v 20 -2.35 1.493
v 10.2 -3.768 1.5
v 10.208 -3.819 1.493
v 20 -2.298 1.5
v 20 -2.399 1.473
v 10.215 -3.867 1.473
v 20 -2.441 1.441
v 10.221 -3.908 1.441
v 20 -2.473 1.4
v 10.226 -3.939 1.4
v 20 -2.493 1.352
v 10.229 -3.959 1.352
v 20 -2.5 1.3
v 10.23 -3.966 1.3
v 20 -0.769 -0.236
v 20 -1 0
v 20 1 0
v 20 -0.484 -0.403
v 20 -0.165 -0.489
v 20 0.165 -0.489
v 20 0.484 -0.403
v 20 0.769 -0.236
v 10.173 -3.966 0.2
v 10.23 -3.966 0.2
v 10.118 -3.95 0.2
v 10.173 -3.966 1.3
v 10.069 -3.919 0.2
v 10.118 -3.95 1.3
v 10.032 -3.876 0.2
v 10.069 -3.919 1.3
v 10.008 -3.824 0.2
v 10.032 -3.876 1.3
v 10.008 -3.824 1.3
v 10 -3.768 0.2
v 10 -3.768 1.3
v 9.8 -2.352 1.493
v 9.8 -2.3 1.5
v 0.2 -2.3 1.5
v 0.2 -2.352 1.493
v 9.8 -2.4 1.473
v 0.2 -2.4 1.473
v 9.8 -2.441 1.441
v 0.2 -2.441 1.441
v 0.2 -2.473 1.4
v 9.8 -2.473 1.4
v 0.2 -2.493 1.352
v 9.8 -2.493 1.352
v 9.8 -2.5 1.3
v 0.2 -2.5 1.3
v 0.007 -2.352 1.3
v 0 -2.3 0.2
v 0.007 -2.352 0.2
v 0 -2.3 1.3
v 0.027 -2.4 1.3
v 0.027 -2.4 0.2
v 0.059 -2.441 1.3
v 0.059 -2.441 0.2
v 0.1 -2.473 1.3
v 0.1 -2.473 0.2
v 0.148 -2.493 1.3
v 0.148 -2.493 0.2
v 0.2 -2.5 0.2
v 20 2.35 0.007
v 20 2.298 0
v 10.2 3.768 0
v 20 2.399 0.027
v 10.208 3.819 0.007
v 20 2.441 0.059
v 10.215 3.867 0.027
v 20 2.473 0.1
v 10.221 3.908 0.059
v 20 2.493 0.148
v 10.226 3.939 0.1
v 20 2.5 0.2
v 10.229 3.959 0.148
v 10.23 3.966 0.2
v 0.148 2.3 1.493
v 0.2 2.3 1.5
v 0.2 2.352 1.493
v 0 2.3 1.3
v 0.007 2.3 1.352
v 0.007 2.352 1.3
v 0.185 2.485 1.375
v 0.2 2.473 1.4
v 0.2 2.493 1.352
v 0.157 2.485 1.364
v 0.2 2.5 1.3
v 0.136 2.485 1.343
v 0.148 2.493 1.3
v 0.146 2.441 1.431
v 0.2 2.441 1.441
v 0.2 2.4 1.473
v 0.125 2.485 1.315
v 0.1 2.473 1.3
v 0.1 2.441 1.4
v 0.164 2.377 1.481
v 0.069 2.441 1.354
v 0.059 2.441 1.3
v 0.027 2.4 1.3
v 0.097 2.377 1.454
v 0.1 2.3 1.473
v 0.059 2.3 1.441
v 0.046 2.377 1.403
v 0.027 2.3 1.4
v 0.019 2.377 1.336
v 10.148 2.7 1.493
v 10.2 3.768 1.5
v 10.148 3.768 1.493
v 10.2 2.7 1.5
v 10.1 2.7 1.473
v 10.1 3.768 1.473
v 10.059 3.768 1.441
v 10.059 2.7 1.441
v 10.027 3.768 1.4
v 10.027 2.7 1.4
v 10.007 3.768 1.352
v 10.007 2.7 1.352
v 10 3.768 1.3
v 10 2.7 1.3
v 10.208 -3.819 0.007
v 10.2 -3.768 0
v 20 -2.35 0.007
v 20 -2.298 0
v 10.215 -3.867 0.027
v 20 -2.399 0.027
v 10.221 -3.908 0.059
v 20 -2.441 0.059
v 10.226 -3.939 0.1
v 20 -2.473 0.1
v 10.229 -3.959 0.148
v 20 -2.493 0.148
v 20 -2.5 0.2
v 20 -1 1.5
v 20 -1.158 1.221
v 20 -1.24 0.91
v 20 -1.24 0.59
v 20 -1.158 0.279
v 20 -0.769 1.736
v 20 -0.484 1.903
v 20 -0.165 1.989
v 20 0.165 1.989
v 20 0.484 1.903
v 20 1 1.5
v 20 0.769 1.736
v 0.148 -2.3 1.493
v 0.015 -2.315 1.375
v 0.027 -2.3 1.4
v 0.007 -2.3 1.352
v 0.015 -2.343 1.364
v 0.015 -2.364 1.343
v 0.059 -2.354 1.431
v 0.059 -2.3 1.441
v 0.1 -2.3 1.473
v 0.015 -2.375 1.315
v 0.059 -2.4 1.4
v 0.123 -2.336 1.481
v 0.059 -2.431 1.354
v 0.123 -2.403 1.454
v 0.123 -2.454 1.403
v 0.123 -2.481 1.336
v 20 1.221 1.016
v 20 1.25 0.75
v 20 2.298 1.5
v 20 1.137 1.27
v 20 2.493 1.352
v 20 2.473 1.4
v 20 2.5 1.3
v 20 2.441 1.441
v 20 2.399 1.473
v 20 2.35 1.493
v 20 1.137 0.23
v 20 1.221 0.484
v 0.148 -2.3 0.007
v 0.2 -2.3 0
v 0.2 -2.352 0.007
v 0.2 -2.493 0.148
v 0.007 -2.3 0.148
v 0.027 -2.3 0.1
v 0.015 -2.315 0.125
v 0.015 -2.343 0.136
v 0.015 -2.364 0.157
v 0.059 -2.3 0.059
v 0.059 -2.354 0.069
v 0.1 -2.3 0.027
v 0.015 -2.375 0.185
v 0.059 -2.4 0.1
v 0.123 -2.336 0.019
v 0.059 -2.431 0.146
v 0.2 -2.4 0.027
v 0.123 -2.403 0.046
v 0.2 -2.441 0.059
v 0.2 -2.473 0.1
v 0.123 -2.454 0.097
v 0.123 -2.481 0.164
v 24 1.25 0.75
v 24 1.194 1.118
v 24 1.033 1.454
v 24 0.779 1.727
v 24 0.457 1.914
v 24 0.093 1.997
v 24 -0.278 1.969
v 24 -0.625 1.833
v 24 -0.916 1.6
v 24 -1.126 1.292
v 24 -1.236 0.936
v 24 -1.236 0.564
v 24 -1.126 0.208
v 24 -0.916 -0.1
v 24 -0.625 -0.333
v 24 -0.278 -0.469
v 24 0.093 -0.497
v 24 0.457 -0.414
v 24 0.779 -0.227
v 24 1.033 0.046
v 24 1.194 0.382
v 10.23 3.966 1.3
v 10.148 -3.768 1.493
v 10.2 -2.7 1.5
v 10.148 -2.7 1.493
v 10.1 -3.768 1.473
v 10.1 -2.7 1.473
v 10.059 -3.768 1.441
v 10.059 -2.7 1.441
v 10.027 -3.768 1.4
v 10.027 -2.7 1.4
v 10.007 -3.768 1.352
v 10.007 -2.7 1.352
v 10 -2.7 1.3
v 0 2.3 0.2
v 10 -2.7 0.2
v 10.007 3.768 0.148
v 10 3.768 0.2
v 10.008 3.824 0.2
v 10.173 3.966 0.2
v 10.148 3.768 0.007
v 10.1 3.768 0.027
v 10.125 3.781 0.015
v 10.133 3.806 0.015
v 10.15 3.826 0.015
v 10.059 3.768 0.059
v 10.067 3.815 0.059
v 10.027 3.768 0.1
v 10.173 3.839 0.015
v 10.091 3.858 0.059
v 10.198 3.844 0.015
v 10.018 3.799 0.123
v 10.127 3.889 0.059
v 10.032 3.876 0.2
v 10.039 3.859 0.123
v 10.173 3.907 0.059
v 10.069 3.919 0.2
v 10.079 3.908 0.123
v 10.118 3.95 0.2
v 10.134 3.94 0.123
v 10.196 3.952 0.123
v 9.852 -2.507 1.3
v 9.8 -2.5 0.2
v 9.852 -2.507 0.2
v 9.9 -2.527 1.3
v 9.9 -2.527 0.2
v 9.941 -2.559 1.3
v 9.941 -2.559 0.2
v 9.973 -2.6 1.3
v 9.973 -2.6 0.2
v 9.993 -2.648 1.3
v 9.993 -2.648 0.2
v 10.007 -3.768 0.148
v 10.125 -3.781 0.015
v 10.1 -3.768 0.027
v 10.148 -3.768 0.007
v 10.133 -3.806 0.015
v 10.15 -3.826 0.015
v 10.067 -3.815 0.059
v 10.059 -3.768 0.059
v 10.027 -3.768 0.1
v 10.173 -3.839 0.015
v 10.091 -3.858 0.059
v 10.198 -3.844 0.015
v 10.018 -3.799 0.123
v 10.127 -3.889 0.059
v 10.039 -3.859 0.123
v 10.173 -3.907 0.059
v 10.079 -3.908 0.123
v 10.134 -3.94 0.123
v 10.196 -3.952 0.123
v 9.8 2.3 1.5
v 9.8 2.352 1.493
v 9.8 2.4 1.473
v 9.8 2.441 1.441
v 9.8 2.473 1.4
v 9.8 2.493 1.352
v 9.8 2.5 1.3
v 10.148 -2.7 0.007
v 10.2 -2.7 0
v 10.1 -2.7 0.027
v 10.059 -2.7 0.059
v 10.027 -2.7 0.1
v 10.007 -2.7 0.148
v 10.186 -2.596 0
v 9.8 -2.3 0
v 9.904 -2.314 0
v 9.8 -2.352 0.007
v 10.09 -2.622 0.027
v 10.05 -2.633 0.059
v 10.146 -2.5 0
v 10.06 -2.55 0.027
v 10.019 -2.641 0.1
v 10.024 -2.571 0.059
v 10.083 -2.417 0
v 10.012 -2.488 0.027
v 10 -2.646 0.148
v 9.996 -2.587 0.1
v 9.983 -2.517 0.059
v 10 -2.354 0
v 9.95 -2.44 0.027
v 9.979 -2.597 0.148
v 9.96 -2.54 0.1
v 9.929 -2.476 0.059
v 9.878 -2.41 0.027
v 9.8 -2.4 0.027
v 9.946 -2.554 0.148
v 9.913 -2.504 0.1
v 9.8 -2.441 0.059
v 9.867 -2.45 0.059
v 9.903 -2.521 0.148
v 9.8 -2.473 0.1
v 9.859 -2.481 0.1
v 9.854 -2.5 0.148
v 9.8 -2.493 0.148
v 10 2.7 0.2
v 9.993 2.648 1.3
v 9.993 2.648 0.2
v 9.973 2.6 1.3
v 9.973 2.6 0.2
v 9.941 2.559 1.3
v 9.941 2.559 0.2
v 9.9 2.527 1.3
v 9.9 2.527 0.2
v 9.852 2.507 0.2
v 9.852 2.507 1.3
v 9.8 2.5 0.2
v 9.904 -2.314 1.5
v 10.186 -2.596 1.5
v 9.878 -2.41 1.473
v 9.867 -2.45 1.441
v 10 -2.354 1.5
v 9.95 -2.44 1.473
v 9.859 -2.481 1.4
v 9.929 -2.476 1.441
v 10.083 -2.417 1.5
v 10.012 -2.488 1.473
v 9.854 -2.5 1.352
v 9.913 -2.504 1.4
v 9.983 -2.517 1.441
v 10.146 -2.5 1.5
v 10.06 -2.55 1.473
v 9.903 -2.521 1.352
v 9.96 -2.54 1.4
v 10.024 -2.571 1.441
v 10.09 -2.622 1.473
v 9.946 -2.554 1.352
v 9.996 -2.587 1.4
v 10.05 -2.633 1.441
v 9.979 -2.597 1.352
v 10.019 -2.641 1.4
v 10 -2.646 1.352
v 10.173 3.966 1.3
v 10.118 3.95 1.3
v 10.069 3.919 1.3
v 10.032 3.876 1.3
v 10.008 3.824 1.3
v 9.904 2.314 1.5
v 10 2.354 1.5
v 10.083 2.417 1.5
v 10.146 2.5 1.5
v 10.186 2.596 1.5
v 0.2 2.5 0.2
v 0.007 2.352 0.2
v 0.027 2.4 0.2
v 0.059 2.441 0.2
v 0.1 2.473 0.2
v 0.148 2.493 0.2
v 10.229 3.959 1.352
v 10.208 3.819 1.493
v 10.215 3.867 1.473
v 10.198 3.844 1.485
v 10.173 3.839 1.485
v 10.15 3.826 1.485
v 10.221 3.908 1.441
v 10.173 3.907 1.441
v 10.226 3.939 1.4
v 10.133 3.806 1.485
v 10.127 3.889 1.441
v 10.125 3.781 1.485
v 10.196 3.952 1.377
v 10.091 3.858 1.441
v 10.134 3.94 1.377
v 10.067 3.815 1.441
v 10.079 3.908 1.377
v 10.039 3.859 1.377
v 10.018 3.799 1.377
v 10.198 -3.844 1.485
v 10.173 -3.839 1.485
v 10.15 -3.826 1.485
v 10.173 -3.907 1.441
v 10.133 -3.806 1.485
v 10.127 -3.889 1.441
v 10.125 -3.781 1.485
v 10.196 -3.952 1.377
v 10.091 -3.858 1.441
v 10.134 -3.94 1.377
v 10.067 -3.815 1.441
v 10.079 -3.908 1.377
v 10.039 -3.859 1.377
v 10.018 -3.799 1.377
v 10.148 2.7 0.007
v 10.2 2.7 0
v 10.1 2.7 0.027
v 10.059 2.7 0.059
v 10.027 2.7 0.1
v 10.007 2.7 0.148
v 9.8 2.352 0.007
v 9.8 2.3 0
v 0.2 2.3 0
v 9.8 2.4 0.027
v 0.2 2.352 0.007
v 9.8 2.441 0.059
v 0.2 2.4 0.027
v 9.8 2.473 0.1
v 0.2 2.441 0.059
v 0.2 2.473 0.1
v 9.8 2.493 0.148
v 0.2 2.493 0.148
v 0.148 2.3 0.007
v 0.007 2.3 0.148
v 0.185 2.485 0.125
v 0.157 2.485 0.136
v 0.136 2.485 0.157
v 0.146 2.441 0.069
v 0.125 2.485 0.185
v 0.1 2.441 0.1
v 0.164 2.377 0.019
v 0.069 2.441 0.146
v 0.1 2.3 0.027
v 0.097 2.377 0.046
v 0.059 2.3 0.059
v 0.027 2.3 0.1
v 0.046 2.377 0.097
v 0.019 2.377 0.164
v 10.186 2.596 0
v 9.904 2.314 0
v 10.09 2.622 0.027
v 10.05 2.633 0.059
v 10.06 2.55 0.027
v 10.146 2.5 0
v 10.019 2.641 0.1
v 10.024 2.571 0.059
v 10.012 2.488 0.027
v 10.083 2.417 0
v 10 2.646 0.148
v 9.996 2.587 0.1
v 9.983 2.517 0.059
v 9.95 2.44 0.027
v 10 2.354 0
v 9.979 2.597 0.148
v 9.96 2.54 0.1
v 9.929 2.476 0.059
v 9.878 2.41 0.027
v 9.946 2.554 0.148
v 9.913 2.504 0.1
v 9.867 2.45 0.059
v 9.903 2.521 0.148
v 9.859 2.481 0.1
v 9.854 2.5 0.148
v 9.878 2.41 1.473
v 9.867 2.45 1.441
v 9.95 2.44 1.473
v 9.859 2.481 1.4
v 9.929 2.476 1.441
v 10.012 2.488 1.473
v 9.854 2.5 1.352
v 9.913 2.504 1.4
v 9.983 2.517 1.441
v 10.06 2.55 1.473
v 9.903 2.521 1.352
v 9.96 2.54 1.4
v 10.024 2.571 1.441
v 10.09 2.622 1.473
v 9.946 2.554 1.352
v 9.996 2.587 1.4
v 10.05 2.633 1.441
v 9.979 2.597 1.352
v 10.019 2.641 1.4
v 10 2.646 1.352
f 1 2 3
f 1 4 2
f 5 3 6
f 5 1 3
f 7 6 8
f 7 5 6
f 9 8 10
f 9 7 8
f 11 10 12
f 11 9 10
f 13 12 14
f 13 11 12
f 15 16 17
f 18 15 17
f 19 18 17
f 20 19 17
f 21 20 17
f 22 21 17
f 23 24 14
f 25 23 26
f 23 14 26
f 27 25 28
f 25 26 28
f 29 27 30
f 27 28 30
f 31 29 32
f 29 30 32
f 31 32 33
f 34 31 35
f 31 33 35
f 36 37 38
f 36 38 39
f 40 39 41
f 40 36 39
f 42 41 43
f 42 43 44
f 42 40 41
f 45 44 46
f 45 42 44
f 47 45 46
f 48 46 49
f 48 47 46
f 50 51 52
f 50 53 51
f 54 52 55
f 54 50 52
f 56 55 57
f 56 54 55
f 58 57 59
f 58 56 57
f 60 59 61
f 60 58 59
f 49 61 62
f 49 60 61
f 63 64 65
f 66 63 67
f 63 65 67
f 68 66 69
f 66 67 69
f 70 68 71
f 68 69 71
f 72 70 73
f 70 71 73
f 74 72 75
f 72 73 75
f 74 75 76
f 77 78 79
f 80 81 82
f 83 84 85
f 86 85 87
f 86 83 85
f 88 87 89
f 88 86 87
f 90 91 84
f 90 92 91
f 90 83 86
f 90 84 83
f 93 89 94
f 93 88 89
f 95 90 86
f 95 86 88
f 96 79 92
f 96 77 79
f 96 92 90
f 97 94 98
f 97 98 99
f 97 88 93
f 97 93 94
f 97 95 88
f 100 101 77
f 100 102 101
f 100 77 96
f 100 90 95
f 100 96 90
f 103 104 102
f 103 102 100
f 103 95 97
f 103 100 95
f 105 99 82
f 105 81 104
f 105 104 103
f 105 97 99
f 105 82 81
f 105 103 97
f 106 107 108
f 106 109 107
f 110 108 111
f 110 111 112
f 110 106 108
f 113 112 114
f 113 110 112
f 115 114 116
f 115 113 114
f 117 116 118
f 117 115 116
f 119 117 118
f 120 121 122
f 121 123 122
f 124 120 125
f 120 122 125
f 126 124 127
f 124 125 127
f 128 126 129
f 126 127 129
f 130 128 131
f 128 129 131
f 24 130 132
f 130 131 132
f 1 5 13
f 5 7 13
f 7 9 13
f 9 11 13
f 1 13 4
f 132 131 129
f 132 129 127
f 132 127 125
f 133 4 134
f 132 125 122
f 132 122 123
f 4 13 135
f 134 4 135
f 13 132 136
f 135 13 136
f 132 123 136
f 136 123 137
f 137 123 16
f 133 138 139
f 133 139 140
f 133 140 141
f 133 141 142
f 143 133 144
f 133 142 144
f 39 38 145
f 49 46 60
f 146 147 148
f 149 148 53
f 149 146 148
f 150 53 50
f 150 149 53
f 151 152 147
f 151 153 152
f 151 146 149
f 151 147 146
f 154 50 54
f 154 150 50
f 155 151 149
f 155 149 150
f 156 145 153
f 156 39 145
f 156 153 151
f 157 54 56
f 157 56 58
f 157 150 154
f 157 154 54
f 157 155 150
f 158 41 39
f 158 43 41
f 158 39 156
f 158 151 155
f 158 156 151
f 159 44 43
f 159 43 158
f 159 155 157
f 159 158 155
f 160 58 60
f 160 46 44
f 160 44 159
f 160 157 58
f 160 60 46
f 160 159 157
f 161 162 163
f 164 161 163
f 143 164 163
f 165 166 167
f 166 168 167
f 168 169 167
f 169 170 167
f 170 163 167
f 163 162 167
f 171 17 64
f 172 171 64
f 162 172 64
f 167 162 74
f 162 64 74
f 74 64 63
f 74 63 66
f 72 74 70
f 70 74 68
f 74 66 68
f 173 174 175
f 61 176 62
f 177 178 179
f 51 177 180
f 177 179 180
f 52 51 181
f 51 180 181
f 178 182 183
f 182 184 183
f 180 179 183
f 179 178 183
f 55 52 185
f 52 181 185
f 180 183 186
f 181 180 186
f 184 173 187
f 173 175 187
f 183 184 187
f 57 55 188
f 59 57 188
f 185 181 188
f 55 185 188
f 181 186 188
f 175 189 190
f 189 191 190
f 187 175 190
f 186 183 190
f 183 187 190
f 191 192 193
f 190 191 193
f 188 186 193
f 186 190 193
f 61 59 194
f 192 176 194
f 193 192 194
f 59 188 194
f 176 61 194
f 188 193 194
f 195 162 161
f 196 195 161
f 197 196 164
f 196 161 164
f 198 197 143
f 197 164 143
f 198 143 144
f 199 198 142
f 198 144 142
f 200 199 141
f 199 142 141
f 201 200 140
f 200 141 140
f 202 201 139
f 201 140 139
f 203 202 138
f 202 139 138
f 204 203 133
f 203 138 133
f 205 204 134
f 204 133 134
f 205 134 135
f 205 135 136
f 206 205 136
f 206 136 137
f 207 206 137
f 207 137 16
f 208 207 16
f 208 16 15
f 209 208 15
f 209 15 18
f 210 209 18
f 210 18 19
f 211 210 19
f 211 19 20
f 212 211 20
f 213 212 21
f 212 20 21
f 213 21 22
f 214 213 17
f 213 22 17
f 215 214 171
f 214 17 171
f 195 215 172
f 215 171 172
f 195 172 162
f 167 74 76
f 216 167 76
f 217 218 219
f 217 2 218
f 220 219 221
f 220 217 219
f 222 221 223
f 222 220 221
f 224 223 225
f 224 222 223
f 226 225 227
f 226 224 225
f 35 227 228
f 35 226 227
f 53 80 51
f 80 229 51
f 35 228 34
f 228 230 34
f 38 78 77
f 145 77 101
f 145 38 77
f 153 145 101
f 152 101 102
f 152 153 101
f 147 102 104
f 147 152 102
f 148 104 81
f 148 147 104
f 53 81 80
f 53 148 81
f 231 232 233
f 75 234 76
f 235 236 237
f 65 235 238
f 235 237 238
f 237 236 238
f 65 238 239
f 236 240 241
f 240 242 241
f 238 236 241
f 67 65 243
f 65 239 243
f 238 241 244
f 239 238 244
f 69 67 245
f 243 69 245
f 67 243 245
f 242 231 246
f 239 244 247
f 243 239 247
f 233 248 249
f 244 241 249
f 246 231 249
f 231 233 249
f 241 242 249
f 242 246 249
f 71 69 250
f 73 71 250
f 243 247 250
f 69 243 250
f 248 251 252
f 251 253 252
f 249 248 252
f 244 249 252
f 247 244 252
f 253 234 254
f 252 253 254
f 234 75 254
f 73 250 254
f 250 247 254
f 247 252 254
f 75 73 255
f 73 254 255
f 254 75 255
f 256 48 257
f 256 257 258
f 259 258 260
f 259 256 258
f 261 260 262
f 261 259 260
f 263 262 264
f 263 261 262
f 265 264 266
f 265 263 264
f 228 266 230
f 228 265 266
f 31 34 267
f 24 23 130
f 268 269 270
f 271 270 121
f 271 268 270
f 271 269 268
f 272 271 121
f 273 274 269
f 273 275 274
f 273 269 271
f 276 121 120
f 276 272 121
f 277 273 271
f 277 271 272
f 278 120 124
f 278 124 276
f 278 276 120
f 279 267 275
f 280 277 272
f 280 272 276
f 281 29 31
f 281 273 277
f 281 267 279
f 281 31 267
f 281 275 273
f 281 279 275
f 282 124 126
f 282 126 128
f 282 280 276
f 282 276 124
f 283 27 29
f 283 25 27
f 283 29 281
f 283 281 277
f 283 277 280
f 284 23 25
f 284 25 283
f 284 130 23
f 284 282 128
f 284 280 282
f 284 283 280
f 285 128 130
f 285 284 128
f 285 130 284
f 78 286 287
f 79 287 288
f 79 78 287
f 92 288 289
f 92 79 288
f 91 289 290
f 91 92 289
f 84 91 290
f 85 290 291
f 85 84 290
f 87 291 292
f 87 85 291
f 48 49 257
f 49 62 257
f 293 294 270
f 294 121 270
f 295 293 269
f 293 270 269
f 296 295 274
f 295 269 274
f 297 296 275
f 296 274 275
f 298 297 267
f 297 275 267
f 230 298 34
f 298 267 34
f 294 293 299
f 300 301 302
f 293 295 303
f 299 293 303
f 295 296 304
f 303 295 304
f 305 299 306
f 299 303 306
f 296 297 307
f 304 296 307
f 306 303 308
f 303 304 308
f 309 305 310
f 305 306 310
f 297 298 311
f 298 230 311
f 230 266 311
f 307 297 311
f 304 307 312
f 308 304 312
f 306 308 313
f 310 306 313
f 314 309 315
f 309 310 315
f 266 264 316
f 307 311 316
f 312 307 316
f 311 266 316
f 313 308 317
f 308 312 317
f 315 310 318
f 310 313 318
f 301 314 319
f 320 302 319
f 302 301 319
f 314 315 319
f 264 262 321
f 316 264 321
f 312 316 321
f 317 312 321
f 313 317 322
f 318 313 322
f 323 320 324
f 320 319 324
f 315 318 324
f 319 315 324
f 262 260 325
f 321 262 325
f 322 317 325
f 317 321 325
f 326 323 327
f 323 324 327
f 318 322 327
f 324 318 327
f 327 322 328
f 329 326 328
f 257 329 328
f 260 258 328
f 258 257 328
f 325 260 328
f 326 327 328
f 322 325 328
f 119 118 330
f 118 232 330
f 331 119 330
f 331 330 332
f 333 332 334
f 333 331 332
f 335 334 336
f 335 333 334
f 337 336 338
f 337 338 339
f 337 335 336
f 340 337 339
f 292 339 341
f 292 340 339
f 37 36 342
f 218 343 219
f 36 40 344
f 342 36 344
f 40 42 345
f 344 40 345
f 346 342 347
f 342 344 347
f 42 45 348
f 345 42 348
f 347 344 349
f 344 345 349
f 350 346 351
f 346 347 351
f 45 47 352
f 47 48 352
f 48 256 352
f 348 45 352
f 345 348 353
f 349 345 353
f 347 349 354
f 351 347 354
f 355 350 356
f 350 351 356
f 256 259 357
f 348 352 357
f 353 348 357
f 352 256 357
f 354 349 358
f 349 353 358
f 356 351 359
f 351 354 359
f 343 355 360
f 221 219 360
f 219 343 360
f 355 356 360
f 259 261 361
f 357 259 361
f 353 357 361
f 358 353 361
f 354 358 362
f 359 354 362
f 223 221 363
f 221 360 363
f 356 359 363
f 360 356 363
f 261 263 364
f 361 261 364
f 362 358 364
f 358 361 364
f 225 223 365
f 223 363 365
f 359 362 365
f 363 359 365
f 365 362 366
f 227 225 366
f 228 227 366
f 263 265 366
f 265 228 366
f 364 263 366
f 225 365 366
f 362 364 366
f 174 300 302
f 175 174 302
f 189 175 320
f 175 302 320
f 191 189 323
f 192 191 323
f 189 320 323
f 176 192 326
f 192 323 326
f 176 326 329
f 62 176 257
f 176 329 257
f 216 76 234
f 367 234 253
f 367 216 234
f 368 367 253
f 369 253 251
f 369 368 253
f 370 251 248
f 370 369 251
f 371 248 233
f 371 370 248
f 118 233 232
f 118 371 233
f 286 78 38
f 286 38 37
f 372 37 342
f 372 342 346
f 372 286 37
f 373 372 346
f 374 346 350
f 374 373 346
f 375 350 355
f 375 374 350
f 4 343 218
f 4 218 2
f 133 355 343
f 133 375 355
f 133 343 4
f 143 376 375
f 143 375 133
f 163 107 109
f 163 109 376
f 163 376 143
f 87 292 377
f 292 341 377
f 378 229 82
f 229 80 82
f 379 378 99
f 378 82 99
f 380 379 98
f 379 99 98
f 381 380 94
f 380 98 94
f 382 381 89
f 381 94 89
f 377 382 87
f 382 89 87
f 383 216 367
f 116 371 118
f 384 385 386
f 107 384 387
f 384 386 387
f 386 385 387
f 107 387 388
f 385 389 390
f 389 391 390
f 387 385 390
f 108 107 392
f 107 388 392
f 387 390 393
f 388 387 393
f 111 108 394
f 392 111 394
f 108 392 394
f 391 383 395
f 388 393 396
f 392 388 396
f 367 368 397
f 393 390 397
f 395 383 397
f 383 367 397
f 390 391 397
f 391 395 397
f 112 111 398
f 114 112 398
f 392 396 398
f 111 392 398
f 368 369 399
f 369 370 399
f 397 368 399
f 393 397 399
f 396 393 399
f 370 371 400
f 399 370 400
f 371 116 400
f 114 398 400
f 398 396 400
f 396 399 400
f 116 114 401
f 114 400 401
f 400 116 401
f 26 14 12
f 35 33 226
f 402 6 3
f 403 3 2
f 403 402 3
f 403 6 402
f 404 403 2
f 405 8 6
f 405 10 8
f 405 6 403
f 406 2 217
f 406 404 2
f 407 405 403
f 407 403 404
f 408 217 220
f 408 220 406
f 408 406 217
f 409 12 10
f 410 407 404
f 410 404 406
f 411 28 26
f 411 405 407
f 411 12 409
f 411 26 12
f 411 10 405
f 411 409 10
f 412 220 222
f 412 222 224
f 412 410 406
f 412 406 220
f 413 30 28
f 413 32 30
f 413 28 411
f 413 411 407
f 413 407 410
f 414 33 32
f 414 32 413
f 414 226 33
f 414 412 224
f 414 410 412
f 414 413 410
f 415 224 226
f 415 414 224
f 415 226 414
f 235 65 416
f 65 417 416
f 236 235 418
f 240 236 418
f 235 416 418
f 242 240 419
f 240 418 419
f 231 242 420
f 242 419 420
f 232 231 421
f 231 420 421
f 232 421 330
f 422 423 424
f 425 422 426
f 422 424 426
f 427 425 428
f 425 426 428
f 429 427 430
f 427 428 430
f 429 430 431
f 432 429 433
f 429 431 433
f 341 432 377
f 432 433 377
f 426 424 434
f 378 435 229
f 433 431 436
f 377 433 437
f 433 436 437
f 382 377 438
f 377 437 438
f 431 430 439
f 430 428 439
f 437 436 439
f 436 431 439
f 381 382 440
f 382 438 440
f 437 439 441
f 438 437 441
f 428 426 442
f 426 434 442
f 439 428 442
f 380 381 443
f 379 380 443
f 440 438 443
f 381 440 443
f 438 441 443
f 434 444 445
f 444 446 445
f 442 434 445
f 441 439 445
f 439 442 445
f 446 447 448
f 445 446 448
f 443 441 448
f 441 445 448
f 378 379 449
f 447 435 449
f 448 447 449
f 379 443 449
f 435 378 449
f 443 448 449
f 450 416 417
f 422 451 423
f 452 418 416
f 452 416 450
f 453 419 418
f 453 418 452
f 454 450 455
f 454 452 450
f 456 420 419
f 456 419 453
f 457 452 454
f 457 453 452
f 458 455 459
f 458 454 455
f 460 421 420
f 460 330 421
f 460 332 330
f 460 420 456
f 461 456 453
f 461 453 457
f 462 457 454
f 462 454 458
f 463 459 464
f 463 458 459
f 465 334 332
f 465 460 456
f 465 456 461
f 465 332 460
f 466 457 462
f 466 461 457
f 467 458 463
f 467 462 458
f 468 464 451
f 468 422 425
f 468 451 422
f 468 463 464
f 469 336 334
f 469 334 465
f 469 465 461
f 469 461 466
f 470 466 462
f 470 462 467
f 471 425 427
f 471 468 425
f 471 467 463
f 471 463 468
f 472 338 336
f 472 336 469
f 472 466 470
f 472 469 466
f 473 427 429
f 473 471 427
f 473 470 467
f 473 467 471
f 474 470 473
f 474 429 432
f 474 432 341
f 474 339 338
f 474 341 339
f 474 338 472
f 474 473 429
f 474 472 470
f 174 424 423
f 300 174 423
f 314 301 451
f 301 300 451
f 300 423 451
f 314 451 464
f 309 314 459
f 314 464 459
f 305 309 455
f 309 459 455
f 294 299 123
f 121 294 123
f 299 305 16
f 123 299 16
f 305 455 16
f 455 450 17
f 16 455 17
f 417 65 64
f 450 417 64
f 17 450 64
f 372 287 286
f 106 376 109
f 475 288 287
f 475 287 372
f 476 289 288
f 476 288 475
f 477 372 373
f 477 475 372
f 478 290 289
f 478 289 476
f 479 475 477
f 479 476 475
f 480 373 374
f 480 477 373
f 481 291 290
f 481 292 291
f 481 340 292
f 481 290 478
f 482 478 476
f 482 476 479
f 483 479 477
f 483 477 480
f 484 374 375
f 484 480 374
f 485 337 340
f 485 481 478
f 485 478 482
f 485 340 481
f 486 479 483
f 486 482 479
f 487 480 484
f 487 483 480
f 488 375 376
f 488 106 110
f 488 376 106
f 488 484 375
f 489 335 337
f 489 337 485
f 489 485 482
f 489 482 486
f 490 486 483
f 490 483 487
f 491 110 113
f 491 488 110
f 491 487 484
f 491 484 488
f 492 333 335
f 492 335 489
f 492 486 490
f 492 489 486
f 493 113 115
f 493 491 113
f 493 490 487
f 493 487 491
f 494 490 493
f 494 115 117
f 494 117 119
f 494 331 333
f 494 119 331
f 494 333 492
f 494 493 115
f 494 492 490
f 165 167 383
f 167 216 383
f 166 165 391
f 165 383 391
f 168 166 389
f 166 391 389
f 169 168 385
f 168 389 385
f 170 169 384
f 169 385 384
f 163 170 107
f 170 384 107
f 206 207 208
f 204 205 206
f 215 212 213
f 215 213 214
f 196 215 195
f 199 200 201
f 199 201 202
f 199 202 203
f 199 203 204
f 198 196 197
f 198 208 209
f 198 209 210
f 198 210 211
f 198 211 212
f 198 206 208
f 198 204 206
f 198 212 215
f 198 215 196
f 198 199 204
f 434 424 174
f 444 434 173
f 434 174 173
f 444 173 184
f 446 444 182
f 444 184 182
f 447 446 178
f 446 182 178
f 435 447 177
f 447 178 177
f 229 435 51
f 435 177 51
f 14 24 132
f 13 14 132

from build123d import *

# Parameters (mm, degrees)
F1_DEPTH = 1.5
F2_R     = 1.25
F3_DEPTH = 4
F4_R     = 0.2


with BuildPart() as f1:
    # F0 (on Top) → F1 (new body)
    with BuildSketch(Plane.XY):
        Polygon((0, 2.5), (0, 0), (0, -2.5), (10, -2.5), (10, -4), (20, -2.5), (20, 0), (20, 2.5), (10, 4), (10, 2.5), align=None)
    extrude(amount=F1_DEPTH)

    # F2 (on face) → F3 (join)
    with BuildSketch(Plane.YZ.offset(20)):
        with Locations((0, 0.75)):
            Circle(F2_R)
    extrude(amount=F3_DEPTH)

    # F4
    f4_edges = [f1.edges().sort_by_distance(p)[0] for p in [
        (5, -2.5, 1.5),
        (0, 0, 1.5),
        (5, 2.5, 1.5),
        (15, 3.25, 1.5),
        (15, -3.25, 1.5),
        (10, -3.25, 1.5),
        (10, 3.25, 1.5),
        (10, -3.25, 0),
        (15, -3.25, 0),
        (5, -2.5, 0),
        (0, 0, 0),
        (10, 3.25, 0),
        (5, 2.5, 0),
        (15, 3.25, 0),
        (10, 4, 0.75),
        (10, 2.5, 0.75),
        (10, -2.5, 0.75),
        (10, -4, 0.75),
        (0, -2.5, 0.75),
        (0, 2.5, 0.75),
    ]]
    fillet(f4_edges, radius=F4_R)


solid = f1.part
